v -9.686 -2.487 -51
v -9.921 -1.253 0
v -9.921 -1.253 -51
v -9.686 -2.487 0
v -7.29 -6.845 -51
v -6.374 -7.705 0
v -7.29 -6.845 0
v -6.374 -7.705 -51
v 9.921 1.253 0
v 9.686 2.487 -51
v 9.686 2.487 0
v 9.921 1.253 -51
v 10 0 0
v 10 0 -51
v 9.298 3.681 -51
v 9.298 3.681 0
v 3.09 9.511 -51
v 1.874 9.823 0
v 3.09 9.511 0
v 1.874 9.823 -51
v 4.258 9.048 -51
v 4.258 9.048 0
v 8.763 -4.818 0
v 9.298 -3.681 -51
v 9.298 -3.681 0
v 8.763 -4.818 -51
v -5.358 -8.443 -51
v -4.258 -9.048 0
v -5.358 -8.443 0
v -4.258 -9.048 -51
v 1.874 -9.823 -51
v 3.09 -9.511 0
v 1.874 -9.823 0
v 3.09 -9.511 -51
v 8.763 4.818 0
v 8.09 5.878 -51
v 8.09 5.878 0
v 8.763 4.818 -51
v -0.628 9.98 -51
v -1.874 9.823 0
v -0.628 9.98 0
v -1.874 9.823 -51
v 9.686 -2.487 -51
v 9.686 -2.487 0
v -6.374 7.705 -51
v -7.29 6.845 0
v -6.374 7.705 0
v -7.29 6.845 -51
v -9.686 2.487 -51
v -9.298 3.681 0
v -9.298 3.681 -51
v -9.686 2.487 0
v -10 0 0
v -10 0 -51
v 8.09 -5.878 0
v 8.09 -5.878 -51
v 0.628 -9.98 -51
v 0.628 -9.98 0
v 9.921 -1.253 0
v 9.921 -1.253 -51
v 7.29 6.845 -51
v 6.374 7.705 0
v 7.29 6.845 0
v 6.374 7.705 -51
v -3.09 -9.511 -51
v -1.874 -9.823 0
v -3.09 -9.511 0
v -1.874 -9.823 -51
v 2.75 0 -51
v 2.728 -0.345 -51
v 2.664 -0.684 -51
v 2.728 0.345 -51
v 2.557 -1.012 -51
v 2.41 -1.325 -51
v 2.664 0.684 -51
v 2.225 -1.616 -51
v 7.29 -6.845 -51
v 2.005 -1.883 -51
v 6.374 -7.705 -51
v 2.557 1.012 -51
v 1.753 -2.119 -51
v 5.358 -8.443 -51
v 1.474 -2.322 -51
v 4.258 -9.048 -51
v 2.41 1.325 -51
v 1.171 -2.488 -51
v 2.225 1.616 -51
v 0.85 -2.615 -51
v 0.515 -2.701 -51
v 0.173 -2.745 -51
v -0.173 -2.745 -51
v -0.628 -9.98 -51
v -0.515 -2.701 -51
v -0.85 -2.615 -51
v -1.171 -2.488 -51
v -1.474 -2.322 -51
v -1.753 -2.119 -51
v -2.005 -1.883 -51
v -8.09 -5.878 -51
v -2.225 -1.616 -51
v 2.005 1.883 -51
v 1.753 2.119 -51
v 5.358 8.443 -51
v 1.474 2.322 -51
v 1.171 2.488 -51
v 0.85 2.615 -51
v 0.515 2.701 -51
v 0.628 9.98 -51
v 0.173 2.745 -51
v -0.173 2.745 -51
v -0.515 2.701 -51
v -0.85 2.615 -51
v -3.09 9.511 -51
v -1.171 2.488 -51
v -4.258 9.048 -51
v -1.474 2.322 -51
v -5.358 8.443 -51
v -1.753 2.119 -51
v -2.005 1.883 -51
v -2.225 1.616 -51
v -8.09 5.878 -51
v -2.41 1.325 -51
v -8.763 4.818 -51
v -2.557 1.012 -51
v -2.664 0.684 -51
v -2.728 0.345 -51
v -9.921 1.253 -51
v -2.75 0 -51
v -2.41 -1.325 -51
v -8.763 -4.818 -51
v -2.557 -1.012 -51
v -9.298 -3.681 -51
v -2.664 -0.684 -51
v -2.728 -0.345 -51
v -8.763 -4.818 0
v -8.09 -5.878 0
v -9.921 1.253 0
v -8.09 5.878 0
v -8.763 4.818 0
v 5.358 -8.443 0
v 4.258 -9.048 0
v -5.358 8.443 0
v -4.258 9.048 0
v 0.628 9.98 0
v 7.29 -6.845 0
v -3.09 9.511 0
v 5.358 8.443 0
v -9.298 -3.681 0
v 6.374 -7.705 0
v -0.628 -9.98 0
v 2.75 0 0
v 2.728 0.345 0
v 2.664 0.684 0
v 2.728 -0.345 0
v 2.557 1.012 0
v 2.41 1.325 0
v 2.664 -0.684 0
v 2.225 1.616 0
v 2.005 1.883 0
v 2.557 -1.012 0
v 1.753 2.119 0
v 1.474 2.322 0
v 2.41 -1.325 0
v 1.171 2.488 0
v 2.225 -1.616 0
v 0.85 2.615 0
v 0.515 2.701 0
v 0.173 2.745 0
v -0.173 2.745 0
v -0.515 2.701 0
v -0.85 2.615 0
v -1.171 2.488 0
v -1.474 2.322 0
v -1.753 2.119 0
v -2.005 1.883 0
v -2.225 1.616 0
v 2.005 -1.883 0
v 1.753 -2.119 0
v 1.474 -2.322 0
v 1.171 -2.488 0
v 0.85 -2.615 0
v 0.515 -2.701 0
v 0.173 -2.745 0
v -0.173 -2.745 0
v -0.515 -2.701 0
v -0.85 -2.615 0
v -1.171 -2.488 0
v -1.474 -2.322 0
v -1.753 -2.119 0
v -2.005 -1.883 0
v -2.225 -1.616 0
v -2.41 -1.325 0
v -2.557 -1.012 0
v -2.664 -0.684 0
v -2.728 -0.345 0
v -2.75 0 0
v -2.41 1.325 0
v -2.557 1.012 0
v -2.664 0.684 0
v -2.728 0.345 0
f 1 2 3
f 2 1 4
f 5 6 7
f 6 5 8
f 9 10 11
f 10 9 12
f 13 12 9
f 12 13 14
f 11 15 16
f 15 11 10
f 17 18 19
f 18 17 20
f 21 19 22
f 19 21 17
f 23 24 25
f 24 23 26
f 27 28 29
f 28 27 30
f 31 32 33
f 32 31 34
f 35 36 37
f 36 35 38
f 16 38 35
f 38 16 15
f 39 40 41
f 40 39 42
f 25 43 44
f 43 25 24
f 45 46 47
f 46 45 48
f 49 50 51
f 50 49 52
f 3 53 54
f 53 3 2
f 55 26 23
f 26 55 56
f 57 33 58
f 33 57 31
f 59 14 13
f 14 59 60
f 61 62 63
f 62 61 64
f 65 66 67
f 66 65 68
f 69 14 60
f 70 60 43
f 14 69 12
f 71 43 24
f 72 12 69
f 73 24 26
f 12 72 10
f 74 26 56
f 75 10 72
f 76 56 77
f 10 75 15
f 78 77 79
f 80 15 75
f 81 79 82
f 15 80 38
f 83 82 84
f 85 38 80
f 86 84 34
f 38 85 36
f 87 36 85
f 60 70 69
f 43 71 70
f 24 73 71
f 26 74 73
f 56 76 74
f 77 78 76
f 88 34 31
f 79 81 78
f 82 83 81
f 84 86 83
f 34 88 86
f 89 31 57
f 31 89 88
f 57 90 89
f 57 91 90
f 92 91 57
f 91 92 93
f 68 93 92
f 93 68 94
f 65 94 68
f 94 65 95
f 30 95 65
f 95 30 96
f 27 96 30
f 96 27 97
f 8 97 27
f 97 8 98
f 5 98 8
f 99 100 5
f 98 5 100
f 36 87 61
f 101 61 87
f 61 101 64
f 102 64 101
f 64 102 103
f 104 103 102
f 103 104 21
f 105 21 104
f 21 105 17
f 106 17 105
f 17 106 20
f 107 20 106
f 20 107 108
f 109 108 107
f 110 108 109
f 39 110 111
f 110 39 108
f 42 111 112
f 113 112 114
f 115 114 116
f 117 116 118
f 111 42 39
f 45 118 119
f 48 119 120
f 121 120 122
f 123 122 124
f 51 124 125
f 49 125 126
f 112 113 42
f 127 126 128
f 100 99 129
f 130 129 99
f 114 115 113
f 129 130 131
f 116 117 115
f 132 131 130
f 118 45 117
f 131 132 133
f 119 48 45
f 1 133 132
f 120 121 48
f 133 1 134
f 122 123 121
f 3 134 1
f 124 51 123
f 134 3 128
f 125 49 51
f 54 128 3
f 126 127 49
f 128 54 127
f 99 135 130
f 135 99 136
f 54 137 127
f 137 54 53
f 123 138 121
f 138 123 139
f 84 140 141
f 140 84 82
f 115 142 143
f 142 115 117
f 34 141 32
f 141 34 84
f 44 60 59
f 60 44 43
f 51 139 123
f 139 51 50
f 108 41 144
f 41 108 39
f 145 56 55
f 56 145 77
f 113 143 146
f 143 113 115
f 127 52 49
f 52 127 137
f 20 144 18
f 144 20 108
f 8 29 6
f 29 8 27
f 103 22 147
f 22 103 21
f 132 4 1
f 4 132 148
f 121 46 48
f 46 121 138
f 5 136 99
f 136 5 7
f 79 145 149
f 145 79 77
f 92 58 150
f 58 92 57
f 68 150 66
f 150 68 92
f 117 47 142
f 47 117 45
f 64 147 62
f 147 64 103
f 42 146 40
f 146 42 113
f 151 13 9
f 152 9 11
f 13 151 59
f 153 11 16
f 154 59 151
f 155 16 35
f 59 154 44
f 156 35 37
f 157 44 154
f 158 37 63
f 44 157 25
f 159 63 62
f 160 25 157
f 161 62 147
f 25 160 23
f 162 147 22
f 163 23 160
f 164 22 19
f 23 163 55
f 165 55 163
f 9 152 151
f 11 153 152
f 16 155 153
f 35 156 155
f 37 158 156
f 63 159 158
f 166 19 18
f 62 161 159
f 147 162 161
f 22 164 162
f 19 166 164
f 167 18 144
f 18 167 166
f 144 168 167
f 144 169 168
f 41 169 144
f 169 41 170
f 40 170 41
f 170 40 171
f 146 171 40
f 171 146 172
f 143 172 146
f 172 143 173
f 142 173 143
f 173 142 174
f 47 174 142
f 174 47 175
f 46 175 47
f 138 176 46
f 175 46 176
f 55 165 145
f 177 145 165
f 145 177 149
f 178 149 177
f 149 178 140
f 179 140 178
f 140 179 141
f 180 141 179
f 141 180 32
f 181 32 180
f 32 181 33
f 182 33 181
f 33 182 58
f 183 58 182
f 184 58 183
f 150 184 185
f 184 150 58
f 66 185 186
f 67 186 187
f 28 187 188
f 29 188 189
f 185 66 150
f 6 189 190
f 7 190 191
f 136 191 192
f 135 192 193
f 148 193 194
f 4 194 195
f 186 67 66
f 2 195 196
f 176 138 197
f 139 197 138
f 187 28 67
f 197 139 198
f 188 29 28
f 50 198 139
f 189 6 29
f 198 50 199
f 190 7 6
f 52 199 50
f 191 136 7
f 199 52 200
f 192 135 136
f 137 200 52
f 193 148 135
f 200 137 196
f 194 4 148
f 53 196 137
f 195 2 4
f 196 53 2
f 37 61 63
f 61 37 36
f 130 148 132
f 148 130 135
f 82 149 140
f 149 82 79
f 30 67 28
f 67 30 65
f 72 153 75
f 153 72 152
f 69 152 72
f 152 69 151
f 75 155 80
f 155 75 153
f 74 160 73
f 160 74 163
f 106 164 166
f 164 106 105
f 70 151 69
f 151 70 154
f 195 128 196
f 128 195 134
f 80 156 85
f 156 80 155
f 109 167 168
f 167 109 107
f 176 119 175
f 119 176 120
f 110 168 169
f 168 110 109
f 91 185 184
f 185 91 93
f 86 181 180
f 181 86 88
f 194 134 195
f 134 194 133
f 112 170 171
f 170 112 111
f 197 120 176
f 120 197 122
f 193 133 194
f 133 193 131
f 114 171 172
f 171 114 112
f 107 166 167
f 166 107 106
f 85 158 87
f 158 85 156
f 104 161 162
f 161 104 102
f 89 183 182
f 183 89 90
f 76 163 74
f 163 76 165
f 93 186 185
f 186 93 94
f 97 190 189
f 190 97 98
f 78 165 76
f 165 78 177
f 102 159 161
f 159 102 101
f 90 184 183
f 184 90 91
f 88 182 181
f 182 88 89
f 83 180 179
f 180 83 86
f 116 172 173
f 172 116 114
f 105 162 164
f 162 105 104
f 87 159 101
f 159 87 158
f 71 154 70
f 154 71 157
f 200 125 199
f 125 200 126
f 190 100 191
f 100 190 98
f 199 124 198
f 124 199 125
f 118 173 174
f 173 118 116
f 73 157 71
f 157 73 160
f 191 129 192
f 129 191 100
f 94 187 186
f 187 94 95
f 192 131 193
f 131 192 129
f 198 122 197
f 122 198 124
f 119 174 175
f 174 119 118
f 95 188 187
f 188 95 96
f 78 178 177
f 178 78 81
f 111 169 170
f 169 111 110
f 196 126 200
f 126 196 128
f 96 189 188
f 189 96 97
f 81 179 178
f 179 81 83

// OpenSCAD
$fn = 50;


difference() {
	union() {
		translate(v = [0, 0, -51.0000000000]) {
			cylinder(h = 51, r = 10.0000000000);
		}
		cylinder(h = 0, r = 13.0000000000);
	}
	union() {
		#translate(v = [0, 0, -51]) {
			cylinder(h = 51, r = 2.7500000000);
		}
	}
}
